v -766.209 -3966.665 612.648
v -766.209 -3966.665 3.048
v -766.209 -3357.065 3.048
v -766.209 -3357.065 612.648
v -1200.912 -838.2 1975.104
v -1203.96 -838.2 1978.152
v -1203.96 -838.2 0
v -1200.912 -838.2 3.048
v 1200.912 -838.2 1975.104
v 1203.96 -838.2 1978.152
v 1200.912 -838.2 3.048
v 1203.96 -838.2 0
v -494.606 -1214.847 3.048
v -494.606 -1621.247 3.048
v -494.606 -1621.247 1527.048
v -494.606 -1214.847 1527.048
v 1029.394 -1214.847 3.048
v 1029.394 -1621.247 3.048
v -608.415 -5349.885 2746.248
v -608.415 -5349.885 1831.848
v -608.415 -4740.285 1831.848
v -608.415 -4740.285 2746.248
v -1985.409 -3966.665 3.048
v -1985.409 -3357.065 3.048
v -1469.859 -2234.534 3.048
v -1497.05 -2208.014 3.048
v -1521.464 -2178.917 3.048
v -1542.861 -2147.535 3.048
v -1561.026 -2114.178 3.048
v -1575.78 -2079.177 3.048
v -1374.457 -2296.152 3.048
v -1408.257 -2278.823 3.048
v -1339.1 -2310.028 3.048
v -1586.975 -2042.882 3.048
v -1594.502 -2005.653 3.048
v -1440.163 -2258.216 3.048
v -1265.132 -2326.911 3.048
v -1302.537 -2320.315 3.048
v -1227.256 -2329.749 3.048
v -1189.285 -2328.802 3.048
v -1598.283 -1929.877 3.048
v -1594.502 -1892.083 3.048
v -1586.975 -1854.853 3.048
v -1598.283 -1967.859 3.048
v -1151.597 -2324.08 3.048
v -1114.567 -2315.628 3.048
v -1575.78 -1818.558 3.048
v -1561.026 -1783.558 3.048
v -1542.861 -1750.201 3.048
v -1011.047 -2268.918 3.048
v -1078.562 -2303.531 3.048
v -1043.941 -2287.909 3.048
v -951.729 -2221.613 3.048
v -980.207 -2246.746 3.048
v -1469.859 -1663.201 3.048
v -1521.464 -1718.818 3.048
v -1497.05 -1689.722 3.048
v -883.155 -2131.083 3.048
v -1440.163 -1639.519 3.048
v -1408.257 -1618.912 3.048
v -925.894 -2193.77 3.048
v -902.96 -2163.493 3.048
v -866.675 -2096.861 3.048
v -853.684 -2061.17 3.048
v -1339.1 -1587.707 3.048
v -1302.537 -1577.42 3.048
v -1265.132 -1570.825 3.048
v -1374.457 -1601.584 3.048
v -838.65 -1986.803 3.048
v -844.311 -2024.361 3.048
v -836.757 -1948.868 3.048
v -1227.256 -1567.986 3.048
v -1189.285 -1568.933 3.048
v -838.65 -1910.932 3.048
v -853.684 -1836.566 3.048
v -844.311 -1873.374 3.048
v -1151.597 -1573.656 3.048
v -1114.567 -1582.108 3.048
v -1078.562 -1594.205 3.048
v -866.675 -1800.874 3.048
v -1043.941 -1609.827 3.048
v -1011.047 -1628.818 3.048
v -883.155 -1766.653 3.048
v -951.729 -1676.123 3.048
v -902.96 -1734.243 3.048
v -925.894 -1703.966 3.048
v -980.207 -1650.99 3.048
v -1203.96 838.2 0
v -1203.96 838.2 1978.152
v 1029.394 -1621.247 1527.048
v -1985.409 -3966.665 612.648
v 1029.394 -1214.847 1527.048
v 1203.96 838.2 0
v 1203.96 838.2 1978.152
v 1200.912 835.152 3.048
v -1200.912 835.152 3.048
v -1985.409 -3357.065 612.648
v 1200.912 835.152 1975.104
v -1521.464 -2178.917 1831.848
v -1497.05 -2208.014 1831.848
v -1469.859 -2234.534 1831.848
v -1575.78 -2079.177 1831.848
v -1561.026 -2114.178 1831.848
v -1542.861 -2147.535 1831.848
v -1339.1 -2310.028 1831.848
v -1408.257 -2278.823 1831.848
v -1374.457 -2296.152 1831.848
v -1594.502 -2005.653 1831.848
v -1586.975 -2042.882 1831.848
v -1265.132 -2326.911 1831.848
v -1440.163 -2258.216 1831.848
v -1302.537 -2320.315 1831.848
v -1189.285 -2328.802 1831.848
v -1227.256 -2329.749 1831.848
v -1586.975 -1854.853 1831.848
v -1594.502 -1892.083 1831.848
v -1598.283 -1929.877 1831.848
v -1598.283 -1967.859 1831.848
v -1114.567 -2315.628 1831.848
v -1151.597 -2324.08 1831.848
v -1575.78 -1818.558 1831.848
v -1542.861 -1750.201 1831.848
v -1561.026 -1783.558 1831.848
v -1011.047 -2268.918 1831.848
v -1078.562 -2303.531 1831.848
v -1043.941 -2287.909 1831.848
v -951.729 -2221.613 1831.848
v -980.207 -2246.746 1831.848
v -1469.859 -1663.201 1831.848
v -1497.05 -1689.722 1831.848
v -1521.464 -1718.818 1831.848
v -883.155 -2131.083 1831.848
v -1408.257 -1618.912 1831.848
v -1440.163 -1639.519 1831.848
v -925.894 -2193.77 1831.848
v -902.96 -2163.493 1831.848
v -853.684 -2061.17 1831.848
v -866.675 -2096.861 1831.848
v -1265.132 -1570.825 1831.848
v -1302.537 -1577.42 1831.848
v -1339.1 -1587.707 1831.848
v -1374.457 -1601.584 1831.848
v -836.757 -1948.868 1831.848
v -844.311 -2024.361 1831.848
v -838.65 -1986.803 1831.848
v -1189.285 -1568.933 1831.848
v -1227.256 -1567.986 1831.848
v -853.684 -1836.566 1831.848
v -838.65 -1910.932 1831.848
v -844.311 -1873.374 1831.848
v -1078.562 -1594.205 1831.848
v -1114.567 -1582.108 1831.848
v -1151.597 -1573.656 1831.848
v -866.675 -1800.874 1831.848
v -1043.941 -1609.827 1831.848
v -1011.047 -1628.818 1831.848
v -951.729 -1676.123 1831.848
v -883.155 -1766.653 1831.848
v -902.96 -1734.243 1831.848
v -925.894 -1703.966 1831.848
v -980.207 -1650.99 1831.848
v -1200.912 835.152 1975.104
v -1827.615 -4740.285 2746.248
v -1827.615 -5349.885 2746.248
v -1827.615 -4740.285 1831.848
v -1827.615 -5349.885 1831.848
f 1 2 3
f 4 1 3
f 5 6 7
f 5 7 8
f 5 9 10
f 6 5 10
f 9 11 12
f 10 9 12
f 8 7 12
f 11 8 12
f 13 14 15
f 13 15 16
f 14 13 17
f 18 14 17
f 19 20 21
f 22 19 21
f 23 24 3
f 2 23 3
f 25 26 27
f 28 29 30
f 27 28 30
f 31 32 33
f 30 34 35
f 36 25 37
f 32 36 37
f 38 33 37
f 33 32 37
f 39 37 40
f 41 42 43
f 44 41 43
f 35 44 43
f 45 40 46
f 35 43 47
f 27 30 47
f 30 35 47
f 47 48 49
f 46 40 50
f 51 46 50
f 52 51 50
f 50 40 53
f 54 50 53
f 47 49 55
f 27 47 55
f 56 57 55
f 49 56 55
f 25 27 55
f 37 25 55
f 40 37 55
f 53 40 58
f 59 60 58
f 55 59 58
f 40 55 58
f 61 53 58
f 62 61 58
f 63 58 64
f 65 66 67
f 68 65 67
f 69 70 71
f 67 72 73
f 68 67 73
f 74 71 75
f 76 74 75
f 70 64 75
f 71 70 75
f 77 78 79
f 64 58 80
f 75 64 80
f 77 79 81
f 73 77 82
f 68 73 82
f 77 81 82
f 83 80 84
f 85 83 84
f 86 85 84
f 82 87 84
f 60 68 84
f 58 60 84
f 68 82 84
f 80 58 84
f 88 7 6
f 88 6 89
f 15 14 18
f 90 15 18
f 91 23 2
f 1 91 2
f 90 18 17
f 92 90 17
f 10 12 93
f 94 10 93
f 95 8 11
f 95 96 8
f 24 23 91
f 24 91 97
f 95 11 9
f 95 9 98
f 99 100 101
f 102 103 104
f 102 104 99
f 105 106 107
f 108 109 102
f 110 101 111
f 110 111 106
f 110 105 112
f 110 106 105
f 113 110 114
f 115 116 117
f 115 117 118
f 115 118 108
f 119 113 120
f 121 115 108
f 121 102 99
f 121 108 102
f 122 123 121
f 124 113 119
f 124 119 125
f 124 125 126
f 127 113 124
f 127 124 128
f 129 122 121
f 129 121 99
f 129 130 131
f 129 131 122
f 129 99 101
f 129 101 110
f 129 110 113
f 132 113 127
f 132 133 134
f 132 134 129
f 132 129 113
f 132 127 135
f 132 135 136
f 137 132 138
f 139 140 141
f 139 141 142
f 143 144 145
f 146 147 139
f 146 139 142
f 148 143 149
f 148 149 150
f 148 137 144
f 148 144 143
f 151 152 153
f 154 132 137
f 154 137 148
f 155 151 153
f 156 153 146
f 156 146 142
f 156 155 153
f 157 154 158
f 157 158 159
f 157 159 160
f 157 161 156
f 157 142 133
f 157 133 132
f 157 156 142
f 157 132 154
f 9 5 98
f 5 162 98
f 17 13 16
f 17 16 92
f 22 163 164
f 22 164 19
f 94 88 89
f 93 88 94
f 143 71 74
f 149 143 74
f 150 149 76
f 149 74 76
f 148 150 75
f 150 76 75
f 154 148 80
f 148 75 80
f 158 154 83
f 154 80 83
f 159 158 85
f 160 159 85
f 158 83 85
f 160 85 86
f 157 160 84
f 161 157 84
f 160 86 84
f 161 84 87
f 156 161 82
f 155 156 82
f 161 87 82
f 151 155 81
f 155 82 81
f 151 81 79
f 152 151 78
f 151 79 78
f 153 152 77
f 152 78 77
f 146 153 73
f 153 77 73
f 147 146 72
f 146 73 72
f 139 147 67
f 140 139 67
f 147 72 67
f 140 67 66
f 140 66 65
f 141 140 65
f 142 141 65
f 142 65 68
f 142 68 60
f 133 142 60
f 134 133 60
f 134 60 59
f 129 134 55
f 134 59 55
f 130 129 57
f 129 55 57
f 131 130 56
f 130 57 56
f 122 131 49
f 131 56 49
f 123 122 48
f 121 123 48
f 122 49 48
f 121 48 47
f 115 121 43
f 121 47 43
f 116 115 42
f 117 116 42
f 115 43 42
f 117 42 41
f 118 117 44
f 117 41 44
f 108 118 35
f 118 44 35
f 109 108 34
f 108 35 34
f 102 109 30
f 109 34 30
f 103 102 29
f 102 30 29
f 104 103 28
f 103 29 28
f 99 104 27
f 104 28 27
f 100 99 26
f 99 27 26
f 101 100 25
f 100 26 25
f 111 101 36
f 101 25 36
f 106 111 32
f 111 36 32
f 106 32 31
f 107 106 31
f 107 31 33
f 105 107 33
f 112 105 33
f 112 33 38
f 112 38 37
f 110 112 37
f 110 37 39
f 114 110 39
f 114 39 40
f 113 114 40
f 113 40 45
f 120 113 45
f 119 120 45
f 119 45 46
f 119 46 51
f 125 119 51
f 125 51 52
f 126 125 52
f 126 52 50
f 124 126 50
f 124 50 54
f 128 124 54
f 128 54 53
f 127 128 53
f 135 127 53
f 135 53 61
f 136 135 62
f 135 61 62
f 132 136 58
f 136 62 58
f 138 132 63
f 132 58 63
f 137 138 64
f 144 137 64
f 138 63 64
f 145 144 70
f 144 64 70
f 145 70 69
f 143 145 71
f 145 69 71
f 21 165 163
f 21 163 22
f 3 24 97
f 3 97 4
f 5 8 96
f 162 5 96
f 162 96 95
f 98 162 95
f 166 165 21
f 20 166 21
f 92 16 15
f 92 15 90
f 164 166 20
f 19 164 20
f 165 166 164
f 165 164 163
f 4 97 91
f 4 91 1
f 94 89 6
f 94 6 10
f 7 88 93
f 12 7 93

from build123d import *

# Parameters (mm, degrees)
F0_W      = 2407.92
F0_H      = 1676.4
F1_DEPTH  = 1978.152
F2_T      = -3.048
F3_R      = 381
F4_DEPTH  = 1828.8
F5_W      = 1524
F5_H      = 406.4
F6_DEPTH  = 1524
F7_W      = 1219.2
F7_H      = 609.6
F8_DEPTH  = 914.4
F9_W      = 1219.2
F9_H      = 609.6
F10_DEPTH = 609.6


with BuildPart() as f1:
    # F0 (on Top) → F1 (new body)
    with BuildSketch(Plane.XY):
        Rectangle(F0_W, F0_H)
    extrude(amount=F1_DEPTH)

    # F2
    f2_openings = [f1.faces().sort_by_distance(p)[0] for p in [
        (0, -838.2, 989.076),
    ]]
    offset(amount=F2_T, openings=f2_openings)


with BuildPart() as f4:
    # F3 (on face) → F4 (new body)
    with BuildSketch(Plane.XY.offset(3.048)):
        with Locations((-1217.756987, -1948.867798)):
            Circle(F3_R)
    extrude(amount=F4_DEPTH)


with BuildPart() as f6:
    # F5 (on face) → F6 (new body)
    with BuildSketch(Plane.XY.offset(3.048)):
        with Locations((267.393768, -1418.047018)):
            Rectangle(F5_W, F5_H)
    extrude(amount=F6_DEPTH)


with BuildPart() as f8:
    # F7 (on face) → F8 (new body)
    with BuildSketch(Plane.XY.offset(1831.848)):
        with Locations((-1218.014717, -5045.084658)):
            Rectangle(F7_W, F7_H)
    extrude(amount=F8_DEPTH)


with BuildPart() as f10:
    # F9 (on face) → F10 (new body)
    with BuildSketch(Plane.XY.offset(3.048)):
        with Locations((-1375.808954, -3661.86494)):
            Rectangle(F9_W, F9_H)
    extrude(amount=F10_DEPTH)


solid = Compound([f1.part, f4.part, f6.part, f8.part, f10.part])
